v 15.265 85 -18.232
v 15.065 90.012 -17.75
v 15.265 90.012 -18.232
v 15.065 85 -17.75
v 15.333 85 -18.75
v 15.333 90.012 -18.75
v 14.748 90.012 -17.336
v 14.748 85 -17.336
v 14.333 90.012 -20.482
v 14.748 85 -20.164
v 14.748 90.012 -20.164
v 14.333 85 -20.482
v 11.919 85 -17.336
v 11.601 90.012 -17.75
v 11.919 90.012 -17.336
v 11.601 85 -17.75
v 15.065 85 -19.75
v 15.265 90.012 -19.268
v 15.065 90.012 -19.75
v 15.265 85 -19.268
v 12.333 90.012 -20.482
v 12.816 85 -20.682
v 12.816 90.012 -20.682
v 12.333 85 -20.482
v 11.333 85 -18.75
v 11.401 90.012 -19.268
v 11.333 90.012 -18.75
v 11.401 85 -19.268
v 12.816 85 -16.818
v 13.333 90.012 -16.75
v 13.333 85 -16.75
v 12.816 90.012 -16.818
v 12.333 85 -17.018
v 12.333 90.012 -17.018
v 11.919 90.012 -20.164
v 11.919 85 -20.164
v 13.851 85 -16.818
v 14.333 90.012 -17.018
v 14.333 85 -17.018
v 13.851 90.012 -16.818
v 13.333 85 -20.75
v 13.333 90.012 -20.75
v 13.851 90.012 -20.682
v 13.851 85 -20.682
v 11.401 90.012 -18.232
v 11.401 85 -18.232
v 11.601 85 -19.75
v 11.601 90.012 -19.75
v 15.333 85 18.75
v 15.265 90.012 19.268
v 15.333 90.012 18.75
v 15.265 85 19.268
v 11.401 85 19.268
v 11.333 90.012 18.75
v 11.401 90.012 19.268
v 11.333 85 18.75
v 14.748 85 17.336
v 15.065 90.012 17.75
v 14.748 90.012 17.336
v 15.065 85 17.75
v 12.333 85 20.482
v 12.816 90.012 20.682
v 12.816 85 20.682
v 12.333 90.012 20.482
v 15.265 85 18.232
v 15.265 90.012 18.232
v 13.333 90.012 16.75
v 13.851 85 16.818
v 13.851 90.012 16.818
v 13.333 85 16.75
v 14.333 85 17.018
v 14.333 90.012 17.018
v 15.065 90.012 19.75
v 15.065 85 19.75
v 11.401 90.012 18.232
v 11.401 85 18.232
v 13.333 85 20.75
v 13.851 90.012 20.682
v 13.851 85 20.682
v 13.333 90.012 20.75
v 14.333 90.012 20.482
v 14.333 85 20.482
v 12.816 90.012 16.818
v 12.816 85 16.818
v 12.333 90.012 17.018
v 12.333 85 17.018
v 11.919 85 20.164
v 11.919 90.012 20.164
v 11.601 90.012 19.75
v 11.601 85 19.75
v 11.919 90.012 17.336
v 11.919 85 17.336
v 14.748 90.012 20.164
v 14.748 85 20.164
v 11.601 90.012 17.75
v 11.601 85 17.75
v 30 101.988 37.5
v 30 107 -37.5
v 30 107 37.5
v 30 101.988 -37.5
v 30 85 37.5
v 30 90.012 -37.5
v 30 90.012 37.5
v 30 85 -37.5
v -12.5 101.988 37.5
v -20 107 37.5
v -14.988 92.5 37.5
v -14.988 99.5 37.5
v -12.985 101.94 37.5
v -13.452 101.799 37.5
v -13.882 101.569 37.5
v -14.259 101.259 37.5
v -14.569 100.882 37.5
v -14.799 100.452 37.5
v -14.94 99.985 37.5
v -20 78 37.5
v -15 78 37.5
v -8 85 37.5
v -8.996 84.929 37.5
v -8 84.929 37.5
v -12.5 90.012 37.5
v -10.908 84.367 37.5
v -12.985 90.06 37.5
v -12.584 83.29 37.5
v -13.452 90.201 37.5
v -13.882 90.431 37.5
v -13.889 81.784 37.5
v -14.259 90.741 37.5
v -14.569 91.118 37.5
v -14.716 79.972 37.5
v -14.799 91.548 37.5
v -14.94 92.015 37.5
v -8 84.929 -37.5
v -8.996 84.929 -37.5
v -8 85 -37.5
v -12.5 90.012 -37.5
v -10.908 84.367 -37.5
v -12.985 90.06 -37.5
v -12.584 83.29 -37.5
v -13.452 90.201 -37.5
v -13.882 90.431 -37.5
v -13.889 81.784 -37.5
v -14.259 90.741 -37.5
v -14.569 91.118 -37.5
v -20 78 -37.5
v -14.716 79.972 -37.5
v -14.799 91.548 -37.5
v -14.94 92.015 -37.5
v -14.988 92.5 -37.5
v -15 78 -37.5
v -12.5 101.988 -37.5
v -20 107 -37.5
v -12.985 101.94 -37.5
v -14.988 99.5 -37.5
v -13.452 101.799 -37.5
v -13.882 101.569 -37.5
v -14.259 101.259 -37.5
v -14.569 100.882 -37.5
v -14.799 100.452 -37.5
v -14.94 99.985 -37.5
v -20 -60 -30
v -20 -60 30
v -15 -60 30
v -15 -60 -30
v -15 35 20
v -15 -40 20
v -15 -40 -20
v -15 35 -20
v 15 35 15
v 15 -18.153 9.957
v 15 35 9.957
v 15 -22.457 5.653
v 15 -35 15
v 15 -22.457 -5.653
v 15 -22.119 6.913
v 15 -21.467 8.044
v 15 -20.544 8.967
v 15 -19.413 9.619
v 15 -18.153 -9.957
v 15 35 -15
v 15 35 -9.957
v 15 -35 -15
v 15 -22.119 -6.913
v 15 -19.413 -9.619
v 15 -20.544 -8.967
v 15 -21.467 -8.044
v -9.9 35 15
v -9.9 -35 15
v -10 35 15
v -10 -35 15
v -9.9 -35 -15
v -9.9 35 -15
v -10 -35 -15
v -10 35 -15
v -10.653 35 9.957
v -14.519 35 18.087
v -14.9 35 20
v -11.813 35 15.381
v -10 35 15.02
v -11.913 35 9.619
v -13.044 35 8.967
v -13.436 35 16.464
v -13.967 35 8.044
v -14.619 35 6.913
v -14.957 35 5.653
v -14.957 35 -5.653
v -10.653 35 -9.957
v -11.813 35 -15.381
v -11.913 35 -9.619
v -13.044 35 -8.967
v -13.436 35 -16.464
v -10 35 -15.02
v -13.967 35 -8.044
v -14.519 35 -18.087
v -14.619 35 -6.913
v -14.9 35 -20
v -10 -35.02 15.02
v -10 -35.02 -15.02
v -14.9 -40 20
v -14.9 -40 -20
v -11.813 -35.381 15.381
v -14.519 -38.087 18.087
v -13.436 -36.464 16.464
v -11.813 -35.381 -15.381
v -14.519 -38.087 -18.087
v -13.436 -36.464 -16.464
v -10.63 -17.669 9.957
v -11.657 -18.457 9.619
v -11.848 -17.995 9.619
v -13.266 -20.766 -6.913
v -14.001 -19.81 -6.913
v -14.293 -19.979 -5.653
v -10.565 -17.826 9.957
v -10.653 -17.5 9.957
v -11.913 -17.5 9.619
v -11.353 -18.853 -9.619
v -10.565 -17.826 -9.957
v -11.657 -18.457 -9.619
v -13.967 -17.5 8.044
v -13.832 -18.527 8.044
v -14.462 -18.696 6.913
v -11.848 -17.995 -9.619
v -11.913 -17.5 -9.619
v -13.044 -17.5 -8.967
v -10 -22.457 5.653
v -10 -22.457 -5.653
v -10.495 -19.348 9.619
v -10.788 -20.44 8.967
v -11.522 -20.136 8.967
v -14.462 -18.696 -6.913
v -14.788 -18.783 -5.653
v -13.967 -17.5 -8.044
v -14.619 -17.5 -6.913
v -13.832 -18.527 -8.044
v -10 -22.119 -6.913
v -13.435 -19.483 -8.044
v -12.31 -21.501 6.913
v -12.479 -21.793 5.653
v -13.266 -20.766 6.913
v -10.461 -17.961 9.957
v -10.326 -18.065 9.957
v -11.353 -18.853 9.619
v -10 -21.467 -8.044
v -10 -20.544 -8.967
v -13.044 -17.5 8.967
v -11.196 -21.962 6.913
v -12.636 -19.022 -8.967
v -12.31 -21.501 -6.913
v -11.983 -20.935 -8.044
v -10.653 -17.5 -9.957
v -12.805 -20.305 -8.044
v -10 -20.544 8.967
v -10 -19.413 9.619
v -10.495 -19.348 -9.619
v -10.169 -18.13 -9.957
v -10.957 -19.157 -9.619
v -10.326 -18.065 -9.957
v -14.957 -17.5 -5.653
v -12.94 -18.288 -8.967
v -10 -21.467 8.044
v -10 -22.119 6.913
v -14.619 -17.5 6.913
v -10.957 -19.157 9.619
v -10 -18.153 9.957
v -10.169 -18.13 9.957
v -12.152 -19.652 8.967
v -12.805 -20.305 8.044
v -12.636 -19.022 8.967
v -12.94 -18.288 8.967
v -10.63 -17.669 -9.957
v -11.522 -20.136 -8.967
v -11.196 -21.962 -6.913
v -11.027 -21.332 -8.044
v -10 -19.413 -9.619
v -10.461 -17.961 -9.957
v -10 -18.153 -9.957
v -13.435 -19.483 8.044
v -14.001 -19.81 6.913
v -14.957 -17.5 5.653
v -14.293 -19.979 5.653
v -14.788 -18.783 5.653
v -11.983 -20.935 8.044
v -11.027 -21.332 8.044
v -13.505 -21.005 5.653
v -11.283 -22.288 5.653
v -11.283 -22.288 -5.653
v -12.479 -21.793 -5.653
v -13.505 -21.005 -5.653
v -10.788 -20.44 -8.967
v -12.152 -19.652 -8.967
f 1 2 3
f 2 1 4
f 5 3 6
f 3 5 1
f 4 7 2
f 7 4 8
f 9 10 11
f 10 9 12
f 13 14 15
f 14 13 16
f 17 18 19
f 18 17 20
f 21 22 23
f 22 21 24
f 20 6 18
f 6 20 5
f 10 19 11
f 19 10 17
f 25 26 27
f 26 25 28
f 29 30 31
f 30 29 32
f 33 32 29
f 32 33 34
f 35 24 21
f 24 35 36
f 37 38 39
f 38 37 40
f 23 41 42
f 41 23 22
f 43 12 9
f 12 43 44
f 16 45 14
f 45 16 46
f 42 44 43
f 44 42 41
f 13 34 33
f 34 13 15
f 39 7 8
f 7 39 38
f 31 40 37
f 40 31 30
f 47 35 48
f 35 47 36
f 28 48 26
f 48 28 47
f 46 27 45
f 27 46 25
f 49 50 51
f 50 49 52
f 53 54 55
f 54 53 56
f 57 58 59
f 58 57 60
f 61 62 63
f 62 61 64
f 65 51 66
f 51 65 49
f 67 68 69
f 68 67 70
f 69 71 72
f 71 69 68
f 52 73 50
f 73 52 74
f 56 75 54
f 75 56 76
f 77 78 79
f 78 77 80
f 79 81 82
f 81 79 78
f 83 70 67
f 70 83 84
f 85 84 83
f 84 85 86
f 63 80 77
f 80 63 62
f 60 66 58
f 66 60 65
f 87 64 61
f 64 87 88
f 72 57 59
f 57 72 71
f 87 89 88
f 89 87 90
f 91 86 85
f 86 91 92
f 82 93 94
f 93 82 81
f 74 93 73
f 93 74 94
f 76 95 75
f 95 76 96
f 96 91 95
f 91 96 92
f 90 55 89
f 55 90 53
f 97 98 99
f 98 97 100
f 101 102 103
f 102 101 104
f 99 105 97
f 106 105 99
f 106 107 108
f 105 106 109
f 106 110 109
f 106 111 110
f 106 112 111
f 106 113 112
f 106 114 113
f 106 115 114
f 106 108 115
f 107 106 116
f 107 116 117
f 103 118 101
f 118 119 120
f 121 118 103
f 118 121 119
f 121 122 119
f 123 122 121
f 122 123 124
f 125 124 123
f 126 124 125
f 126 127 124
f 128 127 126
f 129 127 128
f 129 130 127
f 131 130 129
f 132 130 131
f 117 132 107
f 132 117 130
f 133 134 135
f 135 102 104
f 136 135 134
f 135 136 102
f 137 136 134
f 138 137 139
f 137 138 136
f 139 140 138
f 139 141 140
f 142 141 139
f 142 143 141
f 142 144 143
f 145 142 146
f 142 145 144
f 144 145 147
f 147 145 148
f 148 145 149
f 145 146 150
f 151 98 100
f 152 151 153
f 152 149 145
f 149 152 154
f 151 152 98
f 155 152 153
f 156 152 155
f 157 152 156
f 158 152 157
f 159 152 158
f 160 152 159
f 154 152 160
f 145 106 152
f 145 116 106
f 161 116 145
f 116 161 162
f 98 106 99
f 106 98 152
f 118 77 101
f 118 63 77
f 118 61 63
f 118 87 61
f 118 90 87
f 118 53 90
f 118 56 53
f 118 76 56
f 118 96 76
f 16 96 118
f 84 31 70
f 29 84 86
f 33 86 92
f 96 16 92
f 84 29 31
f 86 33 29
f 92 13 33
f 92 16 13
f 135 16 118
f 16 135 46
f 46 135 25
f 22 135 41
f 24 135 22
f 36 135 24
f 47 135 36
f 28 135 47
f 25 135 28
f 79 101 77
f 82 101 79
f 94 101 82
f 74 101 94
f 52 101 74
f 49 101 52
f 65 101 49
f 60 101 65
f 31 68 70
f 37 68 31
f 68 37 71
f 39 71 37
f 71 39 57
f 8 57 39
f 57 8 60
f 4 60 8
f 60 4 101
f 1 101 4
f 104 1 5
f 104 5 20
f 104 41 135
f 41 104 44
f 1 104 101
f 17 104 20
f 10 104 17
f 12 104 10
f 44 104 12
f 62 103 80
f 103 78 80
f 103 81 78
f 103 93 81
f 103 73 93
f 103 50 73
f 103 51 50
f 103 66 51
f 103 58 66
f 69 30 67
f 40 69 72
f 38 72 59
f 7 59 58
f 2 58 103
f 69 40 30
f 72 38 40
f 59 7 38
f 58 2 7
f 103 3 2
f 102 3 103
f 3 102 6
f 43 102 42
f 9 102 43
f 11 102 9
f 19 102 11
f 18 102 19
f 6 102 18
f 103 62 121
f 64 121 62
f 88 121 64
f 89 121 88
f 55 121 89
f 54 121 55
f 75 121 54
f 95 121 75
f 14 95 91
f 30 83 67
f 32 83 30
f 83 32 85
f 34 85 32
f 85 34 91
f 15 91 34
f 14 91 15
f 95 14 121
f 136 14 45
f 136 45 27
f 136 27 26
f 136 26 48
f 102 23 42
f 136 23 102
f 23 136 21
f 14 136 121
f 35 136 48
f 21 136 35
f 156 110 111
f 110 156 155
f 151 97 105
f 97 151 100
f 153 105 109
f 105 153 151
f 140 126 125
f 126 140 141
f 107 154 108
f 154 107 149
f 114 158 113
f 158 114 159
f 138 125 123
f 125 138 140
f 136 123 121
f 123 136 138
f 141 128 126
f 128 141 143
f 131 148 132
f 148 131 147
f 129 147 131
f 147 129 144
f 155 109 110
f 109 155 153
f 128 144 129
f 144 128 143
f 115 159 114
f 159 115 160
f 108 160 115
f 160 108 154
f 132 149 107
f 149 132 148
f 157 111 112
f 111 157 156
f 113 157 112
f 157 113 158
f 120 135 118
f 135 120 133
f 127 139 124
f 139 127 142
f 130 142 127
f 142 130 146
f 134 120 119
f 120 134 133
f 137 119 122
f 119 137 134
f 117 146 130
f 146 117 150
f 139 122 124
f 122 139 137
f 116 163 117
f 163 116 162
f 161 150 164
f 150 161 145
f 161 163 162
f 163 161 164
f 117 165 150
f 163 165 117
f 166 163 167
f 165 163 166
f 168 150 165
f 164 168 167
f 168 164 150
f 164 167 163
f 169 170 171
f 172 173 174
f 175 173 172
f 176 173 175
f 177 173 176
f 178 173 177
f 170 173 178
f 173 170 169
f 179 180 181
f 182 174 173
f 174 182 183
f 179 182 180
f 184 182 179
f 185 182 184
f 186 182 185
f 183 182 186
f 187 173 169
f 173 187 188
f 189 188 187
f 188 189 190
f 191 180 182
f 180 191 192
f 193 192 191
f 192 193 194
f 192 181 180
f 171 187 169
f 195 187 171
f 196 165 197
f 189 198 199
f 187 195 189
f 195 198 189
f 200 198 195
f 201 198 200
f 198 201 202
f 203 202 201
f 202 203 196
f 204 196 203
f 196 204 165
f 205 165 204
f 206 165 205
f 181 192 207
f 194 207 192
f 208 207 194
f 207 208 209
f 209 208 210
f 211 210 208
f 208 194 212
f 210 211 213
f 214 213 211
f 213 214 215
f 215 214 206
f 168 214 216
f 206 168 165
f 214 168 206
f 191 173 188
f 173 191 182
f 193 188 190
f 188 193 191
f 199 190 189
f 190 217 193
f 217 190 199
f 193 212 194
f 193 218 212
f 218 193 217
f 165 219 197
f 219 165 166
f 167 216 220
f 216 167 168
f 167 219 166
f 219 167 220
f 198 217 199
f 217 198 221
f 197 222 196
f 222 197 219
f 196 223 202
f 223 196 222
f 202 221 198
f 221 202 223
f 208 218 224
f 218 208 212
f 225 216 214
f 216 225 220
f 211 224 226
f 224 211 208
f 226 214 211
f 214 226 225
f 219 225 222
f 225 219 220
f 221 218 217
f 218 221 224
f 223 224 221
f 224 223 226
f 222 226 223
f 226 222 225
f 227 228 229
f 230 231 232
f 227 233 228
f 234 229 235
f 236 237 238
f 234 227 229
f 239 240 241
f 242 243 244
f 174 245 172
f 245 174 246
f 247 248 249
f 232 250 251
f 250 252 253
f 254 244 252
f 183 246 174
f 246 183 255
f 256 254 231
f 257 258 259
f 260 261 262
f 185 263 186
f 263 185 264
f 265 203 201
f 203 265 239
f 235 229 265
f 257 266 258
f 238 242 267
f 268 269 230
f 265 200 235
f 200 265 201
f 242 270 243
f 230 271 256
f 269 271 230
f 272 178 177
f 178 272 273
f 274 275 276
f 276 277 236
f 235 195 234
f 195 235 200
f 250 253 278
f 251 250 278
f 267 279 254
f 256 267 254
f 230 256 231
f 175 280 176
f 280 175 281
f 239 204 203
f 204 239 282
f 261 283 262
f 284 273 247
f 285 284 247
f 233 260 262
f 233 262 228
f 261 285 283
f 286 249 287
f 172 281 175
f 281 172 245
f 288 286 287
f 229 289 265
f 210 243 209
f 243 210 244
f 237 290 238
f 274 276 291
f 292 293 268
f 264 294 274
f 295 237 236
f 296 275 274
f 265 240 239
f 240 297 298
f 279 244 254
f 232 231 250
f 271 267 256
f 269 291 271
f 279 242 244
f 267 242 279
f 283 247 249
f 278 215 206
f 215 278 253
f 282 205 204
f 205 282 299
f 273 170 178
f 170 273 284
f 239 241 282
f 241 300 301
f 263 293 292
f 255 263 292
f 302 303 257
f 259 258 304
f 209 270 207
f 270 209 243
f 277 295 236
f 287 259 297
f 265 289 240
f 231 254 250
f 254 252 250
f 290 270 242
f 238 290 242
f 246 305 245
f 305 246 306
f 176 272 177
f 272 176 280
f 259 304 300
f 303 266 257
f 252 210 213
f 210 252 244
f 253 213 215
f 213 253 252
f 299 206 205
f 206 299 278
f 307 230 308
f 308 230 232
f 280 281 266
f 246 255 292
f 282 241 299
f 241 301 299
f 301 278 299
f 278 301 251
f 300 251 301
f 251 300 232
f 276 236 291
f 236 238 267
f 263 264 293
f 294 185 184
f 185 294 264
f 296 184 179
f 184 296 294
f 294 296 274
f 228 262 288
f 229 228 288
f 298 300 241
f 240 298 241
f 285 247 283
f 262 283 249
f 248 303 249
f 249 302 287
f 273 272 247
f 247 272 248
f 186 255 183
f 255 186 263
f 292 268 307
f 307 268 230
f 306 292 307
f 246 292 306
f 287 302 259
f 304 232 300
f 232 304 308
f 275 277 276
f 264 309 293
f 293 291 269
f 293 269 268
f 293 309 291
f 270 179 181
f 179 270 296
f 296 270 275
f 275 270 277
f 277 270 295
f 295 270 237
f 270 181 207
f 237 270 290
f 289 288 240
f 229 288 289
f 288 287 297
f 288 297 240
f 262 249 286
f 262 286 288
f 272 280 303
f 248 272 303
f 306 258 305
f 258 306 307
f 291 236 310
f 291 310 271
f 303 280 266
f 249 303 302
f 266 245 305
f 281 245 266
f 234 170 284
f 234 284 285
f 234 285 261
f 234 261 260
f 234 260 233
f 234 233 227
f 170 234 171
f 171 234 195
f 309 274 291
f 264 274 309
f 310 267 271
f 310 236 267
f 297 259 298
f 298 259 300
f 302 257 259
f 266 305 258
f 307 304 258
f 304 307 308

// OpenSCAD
/*  EasyShelves. Pole hanger Generator. Enables users of the Moidules
    modules to create a customized pole hanger. The design is simple in order to be easilly printable.
    EasyShelves is Not Moidules.
    Copyright (C) 2015  PMorel for Thilab (www.thilab.fr)

    This program is free software: you can redistribute it and/or modify
    it under the terms of the GNU General Public License as published by
    the Free Software Foundation, either version 3 of the License, or
    (at your option) any later version.

    This program is distributed in the hope that it will be useful,
    but WITHOUT ANY WARRANTY; without even the implied warranty of
    MERCHANTABILITY or FITNESS FOR A PARTICULAR PURPOSE.  See the
    GNU General Public License for more details.

    You should have received a copy of the GNU General Public License
    along with this program.  If not, see <http://www.gnu.org/licenses/>.
*/

//Thickness of the walls
wall_thickness=5;
//Distance between the top of the pole hanger and the bottom of the bracket
polehanger_distance_from_top=50;
//Radius of the pole that must fit in this pole hanger
pole_radius = 10;
//Height of the pole hanger
polehanger_height=70;
//Depth of the pole hanger
polehanger_depth=30;
//Solid bottom part of the pole hanger
polehanger_solid_part_bottom=10;
//Thickness of the wood
wood_thickness=12;
//Depth of the bracket
depth=50;
//Screws
number_of_screws = 2; //[0,1,2]
//Screw diameter
screw_diameter = 4; //[1:12]
//Top screws
top_screws = "no";
//Inner screws
inner_screws= "yes";

/* [Hidden] */
// The height of the bracket
hCube = wood_thickness+2*wall_thickness;
// Width of the pole hanger
polehanger_width=pole_radius*2+wall_thickness*2;
// Height of the piece that supports the pole hanger
support_height=polehanger_distance_from_top+polehanger_height+polehanger_distance_from_top/2;
// Width of the support at the top near the bracket
support_width_top=polehanger_width*2.5;
// Width of the support at the bottom
support_width_bottom=polehanger_width*2;
// length of the bracket 
front_side_length = support_width_top;
//Fillet of the pole hanger
fillet_size = 5;
//Fillet inside the bracket
board_fillet_size=0.5;
//Fillet between the bracket and the support
link_fillet=7;


//Main module
poleHanger();


// This module creates the complete pole hanger. 
module poleHanger() {
   union() {
        translate([0,-support_height/2+polehanger_height/2 + polehanger_distance_from_top , 0])
        union() {
            //The support of the hanger
            translate([-polehanger_depth/2-wall_thickness,support_height/2-link_fillet,-support_width_top/2]) rotate([90,-90,90]) trapezoid(support_width_top, support_width_bottom, support_height-link_fillet,wall_thickness);
            // Create the bracket
            translate([-polehanger_depth/2-wall_thickness,support_height/2,-support_width_top/2]) 
                difference() {
                    bracket(inner_screws,top_screws,0);
                    translate([wall_thickness,wall_thickness,0]) 
                        boardH(0);
                }
            //Add a fillet between the support and the bracket
                translate([-polehanger_depth/2-wall_thickness,support_height/2-link_fillet,-support_width_top/2]) {
                difference() {
                    cube([link_fillet+wall_thickness,link_fillet,support_width_top]);
                    translate([link_fillet+wall_thickness,0,-0.1]) cylinder(r=link_fillet, h=support_width_top+1);
                }
            }
        }        
        // Create the hanger
        createHanger();
    }
}

module createHanger() {
    sphere_radius = pole_radius*0.5;
    internal_cube_width=pole_radius*2 - 2*sphere_radius;
    difference() {

        difference() {

           union() {
               //the main cube that forms the coat_hanger
                cube([polehanger_depth,polehanger_height,polehanger_width],true);
                //the cube used to create a fillet between the main cube and the support
                translate([-polehanger_depth/2+fillet_size/2,-fillet_size/2,0]) cube([fillet_size,polehanger_height+fillet_size,polehanger_width+fillet_size*2],true);
           }
           
           union() {
               // First cylinder for the fillet
                translate([-polehanger_depth/2+fillet_size+0.1,0,polehanger_width/2+fillet_size]) rotate([90,0,0]) cylinder(r=fillet_size,h=80,center=true);
               // Second cylinder for the fillet 
                translate([-polehanger_depth/2+fillet_size+0.1,0,-polehanger_width/2-fillet_size]) rotate([90,0,0]) cylinder(r=fillet_size,h=80,center=true);
                // Third cylinder for the fillet
                translate([-polehanger_depth/2+fillet_size+0.1,-polehanger_height/2-fillet_size,0]) rotate([0,0,0]) cylinder(r=fillet_size,h=80,center=true);
               // The shape that forms the hole for the coat hanger pole
                
               translate([sphere_radius,sphere_radius/2+polehanger_solid_part_bottom,0])
                    minkowski() {
                        sphere($fn=24,r=sphere_radius);
                        cube([polehanger_depth,polehanger_height-polehanger_solid_part_bottom,internal_cube_width],true);
                    }
           }
       }
    }
}

// Create a trapezoid
module trapezoid(width_base, width_top,height,thickness) {
    linear_extrude(height = thickness) polygon(points=[[0,0],[width_base,0],[width_base-(width_base-width_top)/2,height],[(width_base-width_top)/2,height]], paths=[[0,1,2,3]]);
}

module boardH( shift ) {
    sphere_radius = board_fillet_size*wall_thickness;
    board_cube_thickness = wood_thickness-sphere_radius*2;
    translate([sphere_radius,sphere_radius,0])
        minkowski() {
            sphere($fn=32, r=sphere_radius);
            cube([depth, board_cube_thickness, front_side_length]);
            }
}

// Draw the bracket shape
module bracket( left_screws, right_screws, shift) {
        rotate([0,0,0]) {
            difference() {
                cube([depth,hCube,front_side_length]);
                
                //Draw the inner screws
                if( left_screws == "yes" ) {
                    width = wall_thickness;
                    height = front_side_length;
                    if( number_of_screws == 1 ) { 
                      translate([depth*2/3,wall_thickness+0.1,front_side_length/2]) rotate([90,0,0]) cylinder($fn=24, r=screw_diameter/2, h=width+2);                
                    } else if(number_of_screws == 2) {
                      translate([depth*2/3,wall_thickness+0.1,front_side_length/4]) rotate([90,0,0]) cylinder($fn=24, r=screw_diameter/2, h=width+2);                
                      translate([depth*2/3,wall_thickness+0.1,front_side_length*3/4]) rotate([90,0,0]) cylinder($fn=24, r=screw_diameter/2, h=width+2);             
                    }
                }
                //Draw the top screws
                if( right_screws == "yes" ) {
                    width = wall_thickness;
                    screw_shift = wall_thickness*2 + wood_thickness + 1;
                    height = front_side_length;
                    if( number_of_screws == 1 ) { 
                      translate([depth*2/3,screw_shift+0.1,front_side_length/2]) rotate([90,0,0]) cylinder($fn=24, r=screw_diameter/2, h=width+2);                
                    } else if(number_of_screws == 2) {
                      translate([depth*2/3,screw_shift+0.1,front_side_length/4]) rotate([90,0,0]) cylinder($fn=24, r=screw_diameter/2, h=width+2);                
                      translate([depth*2/3,screw_shift+0.1,front_side_length*3/4]) rotate([90,0,0]) cylinder($fn=24, r=screw_diameter/2, h=width+2);             
                    }
                }
           }
       }
}
